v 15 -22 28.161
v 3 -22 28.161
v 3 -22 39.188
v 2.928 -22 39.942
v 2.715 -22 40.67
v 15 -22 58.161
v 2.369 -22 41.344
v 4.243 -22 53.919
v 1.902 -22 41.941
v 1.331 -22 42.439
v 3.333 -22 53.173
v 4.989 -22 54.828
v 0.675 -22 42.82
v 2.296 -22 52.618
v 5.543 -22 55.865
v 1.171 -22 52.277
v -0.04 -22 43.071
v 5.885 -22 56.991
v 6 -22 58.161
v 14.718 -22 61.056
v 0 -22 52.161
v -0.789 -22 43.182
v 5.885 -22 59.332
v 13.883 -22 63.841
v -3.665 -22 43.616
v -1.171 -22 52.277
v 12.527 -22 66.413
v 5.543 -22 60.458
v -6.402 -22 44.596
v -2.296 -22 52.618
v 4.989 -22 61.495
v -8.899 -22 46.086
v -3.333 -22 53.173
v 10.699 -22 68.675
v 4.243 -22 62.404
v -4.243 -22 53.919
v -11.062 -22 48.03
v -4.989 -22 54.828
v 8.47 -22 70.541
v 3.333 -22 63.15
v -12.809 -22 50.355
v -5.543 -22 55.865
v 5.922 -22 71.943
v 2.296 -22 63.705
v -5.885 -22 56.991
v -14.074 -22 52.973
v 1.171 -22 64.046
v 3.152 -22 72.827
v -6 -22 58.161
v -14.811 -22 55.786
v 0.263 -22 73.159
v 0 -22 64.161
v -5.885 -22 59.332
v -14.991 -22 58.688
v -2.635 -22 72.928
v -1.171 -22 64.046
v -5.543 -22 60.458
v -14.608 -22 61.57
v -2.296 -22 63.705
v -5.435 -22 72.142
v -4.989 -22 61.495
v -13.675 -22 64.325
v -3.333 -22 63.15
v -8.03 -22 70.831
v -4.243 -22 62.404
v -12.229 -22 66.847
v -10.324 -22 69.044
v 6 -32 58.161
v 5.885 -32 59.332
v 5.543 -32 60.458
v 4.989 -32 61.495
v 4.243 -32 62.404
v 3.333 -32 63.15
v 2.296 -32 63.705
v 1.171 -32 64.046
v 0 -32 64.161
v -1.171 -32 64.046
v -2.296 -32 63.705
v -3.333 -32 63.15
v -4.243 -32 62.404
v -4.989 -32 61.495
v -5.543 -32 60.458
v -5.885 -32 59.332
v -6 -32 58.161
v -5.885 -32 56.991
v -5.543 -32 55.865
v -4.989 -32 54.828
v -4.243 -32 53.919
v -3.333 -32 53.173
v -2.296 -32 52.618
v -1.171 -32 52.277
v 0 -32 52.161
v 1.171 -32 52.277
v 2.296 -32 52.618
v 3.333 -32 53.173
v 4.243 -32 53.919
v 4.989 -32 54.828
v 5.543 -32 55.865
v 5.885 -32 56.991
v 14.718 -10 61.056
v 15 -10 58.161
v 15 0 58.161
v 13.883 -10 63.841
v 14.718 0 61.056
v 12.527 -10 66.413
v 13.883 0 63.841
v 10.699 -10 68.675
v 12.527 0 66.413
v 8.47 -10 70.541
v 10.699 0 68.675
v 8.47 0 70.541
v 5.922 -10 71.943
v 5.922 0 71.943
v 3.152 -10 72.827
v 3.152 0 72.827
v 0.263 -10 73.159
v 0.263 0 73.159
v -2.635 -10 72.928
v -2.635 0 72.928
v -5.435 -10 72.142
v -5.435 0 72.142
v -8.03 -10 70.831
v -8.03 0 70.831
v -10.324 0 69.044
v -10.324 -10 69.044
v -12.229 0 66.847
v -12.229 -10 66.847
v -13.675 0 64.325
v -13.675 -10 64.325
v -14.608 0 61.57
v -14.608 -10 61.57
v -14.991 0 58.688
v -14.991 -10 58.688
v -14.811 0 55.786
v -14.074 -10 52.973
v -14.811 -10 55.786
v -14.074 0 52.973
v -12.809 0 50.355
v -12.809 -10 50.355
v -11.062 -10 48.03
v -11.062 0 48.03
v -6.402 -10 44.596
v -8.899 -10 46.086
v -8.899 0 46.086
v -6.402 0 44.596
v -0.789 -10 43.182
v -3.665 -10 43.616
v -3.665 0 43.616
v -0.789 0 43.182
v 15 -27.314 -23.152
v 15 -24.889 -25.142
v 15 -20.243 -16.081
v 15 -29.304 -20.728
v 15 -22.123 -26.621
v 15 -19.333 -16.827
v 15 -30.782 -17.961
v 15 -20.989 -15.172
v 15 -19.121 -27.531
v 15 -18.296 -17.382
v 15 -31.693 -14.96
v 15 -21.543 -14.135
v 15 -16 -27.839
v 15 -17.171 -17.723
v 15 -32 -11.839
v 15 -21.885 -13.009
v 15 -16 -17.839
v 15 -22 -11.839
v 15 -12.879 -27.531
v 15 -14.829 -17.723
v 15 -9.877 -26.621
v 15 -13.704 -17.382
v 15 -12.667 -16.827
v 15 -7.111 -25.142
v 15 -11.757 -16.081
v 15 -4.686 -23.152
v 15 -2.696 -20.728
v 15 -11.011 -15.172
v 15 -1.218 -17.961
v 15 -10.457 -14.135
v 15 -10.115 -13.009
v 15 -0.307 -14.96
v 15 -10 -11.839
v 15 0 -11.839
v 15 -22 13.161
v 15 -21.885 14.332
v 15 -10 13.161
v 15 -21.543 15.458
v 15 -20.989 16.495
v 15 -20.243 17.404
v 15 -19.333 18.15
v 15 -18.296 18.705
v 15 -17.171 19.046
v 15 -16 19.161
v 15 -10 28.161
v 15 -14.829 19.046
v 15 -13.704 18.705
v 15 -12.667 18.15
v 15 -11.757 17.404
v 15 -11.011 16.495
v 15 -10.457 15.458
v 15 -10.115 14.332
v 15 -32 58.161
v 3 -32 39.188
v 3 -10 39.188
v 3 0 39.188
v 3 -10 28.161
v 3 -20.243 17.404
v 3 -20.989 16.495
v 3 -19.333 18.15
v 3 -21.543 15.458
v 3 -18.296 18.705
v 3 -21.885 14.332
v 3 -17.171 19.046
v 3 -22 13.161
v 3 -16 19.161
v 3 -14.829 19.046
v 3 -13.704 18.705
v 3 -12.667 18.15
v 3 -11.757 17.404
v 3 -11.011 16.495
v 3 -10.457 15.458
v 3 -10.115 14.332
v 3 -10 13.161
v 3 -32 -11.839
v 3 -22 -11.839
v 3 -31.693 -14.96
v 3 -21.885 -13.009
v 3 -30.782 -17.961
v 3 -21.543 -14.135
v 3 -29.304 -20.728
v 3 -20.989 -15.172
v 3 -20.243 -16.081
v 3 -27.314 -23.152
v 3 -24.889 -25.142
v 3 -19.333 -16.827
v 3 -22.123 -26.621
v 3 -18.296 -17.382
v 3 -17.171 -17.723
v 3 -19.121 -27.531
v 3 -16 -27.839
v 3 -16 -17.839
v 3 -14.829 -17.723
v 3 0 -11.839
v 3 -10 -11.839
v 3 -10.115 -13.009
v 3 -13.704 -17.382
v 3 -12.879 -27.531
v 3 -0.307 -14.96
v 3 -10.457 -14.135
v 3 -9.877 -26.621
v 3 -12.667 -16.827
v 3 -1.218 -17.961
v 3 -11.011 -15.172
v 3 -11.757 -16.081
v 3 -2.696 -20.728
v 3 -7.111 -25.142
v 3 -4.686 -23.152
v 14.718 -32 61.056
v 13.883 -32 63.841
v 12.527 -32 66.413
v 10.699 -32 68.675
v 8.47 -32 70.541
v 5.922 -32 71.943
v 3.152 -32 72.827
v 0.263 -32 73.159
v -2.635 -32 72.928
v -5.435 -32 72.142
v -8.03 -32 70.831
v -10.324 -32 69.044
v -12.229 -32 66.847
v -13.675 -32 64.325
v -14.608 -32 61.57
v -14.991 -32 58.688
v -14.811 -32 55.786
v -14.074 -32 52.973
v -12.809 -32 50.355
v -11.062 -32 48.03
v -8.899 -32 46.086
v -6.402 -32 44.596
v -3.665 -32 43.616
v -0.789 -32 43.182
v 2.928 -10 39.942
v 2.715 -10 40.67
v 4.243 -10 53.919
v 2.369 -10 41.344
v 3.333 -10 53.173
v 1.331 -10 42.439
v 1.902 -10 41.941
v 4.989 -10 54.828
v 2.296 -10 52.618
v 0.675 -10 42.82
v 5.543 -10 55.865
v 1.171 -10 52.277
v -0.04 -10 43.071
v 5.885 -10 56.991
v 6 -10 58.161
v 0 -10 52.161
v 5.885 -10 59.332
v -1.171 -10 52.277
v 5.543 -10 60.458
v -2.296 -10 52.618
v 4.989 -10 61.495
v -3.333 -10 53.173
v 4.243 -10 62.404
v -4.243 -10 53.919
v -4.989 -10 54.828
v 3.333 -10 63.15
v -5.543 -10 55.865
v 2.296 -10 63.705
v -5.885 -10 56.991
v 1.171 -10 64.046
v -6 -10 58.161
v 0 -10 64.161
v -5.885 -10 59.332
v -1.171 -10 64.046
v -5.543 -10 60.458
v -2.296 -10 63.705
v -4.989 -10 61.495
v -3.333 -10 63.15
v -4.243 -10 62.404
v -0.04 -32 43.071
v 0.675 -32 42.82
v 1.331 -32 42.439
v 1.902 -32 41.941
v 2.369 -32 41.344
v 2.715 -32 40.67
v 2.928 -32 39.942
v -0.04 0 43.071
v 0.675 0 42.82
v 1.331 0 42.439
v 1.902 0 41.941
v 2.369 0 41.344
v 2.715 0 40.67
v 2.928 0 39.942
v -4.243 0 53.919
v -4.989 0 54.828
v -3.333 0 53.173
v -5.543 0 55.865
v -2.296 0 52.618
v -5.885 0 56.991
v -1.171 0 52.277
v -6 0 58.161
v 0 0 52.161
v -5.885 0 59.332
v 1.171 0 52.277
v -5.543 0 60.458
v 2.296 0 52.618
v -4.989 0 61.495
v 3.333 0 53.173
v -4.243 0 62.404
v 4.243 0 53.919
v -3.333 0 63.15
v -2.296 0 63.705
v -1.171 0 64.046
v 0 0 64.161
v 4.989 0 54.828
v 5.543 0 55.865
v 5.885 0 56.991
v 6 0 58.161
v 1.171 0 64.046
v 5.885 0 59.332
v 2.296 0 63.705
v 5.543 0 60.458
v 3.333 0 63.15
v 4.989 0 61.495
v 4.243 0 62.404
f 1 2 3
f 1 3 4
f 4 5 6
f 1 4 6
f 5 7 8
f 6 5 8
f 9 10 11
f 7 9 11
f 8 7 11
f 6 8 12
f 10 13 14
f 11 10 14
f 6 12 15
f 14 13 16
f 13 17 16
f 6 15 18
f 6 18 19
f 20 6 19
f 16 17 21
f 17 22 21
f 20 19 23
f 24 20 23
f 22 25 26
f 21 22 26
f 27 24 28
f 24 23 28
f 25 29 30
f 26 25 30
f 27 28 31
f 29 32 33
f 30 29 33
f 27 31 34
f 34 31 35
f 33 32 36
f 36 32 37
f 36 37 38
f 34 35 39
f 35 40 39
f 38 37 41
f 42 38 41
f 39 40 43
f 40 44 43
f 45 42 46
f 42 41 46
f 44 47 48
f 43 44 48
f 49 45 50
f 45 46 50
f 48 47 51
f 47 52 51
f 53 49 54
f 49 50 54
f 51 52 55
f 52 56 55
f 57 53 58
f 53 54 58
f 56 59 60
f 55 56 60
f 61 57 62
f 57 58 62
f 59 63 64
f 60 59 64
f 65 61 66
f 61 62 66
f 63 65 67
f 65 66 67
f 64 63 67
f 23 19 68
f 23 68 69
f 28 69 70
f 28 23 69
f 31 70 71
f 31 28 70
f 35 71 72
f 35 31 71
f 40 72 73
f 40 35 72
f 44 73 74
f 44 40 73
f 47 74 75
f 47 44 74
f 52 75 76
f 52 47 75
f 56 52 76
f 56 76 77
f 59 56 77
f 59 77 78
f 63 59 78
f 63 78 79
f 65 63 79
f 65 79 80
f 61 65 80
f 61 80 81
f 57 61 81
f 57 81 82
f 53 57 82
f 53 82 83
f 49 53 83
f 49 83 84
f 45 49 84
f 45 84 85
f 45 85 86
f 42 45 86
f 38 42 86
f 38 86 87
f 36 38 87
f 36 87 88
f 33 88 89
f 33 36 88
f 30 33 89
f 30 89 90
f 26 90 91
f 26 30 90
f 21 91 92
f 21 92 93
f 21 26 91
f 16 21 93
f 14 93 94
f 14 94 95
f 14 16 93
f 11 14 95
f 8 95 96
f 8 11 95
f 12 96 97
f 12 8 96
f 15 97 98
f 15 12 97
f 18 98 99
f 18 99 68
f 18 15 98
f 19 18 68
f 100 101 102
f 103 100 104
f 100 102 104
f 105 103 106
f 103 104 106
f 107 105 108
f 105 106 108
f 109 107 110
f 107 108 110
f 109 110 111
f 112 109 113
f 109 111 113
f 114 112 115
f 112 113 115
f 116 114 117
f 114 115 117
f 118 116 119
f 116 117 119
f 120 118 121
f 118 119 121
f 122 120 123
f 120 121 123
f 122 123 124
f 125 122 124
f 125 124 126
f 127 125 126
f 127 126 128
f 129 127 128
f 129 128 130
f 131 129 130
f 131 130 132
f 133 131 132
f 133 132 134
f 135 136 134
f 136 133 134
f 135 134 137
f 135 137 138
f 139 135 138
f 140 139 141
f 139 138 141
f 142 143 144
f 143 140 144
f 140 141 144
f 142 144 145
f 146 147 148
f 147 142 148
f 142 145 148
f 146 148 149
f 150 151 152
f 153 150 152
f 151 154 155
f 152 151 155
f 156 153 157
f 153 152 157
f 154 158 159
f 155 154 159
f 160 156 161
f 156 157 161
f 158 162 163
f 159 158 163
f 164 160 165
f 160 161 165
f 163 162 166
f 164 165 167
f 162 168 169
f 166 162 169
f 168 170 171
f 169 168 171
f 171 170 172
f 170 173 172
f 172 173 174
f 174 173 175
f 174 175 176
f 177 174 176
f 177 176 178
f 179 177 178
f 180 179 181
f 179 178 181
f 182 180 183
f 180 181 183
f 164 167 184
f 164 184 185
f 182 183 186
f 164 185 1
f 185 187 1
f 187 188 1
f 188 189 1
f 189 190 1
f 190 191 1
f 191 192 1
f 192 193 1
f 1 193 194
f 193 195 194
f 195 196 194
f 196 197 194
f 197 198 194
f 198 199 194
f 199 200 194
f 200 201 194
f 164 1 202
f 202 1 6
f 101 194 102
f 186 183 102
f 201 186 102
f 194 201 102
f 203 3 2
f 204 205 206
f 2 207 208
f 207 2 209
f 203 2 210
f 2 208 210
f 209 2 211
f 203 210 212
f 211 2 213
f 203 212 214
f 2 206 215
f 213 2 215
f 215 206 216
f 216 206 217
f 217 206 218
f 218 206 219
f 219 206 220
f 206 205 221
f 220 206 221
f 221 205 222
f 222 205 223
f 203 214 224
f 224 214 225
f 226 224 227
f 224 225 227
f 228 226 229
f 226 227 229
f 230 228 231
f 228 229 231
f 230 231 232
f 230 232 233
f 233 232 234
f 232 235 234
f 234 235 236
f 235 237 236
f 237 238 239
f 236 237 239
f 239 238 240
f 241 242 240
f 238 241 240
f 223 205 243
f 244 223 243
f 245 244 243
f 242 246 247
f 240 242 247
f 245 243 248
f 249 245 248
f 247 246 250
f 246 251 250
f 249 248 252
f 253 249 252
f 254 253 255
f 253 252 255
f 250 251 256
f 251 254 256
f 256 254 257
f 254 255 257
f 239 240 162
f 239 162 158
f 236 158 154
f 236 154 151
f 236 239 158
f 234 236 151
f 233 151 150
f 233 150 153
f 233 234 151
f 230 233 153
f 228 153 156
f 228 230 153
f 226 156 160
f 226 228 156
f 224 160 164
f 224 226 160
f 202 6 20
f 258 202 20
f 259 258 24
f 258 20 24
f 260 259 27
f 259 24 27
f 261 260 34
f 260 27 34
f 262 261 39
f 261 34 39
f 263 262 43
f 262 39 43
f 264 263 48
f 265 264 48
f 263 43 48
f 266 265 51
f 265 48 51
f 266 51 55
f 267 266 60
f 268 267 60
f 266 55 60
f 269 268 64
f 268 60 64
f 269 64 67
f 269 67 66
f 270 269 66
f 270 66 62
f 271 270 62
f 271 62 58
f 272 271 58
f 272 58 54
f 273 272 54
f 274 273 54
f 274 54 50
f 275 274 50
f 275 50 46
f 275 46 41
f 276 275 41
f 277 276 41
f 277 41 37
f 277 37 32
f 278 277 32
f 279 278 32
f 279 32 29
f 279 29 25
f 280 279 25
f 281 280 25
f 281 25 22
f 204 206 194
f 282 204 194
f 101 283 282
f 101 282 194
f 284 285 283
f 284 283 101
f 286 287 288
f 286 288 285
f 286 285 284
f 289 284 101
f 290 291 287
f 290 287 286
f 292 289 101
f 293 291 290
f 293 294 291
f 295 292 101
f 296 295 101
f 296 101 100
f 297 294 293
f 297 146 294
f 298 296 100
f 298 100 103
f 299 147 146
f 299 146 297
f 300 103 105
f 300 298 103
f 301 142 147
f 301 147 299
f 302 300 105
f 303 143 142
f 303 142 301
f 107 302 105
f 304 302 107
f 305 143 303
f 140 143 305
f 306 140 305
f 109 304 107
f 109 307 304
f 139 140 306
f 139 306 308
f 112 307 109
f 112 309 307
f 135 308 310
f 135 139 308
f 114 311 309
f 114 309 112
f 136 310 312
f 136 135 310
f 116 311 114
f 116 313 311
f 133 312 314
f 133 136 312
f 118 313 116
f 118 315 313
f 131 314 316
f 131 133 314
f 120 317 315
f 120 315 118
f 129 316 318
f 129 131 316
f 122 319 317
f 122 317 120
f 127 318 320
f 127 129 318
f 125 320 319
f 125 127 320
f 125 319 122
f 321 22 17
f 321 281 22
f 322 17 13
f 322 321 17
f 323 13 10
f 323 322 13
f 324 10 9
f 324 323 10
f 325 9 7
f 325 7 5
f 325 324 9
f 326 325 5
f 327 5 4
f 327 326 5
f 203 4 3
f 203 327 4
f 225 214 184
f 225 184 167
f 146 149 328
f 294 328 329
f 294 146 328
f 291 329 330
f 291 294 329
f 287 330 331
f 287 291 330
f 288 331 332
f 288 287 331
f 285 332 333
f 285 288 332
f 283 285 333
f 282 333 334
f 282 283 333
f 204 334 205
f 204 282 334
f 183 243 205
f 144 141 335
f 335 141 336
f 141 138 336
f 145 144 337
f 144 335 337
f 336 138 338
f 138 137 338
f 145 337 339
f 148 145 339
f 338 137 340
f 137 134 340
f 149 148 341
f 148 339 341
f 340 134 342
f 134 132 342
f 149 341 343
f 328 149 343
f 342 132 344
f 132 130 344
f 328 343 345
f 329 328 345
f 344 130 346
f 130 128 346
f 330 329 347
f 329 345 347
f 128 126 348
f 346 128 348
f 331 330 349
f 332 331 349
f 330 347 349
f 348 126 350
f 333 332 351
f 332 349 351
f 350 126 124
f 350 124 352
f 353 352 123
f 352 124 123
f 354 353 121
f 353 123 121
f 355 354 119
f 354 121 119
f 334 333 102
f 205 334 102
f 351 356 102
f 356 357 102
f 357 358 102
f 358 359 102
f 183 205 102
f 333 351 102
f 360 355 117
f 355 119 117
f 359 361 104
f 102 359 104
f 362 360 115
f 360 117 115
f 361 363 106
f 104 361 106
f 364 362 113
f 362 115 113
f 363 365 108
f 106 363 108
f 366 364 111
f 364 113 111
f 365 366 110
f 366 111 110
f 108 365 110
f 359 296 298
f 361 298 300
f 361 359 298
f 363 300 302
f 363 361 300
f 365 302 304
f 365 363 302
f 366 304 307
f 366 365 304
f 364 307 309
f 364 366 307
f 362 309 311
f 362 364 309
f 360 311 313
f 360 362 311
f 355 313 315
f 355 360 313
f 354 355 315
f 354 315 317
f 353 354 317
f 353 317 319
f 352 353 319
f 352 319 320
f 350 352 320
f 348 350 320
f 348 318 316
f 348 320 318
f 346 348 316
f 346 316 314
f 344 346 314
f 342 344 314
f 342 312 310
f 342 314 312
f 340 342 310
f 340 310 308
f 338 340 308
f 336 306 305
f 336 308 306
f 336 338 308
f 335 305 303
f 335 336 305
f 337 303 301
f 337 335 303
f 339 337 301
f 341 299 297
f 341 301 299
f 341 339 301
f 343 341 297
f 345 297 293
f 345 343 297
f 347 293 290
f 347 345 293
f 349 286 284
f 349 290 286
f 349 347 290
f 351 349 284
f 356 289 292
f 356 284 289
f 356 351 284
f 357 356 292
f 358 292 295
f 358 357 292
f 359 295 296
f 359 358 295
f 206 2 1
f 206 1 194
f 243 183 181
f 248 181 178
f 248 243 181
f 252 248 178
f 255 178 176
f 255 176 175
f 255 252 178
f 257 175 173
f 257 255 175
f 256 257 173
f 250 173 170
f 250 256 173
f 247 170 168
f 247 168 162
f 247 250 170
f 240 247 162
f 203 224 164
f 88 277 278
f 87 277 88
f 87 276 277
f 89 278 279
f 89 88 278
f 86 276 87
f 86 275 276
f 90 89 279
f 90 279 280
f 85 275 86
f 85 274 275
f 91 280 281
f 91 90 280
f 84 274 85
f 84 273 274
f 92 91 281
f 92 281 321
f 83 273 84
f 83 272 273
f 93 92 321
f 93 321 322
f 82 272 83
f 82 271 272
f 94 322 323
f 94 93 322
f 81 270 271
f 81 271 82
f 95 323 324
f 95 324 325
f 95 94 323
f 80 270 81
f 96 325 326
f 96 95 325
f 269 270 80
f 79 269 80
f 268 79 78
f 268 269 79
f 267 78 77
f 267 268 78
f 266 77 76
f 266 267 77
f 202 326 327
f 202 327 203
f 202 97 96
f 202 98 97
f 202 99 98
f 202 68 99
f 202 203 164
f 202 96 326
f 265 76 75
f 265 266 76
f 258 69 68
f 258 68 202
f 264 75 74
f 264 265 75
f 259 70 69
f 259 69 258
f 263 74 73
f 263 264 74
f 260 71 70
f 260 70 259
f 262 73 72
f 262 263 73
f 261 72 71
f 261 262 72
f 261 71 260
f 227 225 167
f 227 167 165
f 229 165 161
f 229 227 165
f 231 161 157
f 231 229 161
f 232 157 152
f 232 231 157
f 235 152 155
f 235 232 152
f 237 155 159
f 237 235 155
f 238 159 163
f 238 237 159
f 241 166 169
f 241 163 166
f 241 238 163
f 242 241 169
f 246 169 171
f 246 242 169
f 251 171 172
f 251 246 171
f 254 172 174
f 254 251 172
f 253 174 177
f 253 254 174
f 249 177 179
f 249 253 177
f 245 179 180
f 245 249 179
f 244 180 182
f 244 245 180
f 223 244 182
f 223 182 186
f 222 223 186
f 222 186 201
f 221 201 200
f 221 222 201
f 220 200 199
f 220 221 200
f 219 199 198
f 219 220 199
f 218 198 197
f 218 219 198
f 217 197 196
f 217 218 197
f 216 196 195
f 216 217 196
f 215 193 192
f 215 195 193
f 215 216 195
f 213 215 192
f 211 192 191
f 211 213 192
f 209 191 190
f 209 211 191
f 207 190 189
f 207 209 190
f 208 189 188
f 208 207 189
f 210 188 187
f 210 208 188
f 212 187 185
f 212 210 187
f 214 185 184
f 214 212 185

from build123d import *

# Parameters (mm, degrees)
F0_R     = 6
F1_DEPTH = 32
F3_W     = 12
F3_H     = 45
F4_DEPTH = 55.801
F5_R     = 4


with BuildPart() as f1:
    # F0 (on Front) → F1 (new body)
    with BuildSketch(Plane.XZ):
        with BuildLine():
            Line((15, -27.838539), (15, 58.161461))
            ThreePointArc((15, 58.161461), (-11.61895, 67.648294), (3, 43.464522))
            Line((3, 43.464522), (3, -27.838539))
            Line((3, -27.838539), (15, -27.838539))
        make_face()
        with Locations((0, 58.161461)):
            Circle(F0_R, mode=Mode.SUBTRACT)
    extrude(amount=F1_DEPTH)

    # F3 (on offset) → F4 (cut, through all)
    with BuildSketch(Plane.YZ.offset(-40.8)):
        with BuildLine():
            Line((0, -27.838539), (0, -11.838539))
            ThreePointArc((0, -11.838539), (-4.686292, -23.152248), (-16, -27.838539))
            Line((-16, -27.838539), (0, -27.838539))
        make_face()
        with BuildLine():
            Line((-32, -27.838539), (-16, -27.838539))
            ThreePointArc((-16, -27.838539), (-27.313708, -23.152248), (-32, -11.838539))
            Line((-32, -11.838539), (-32, -27.838539))
        make_face()
        with BuildLine():
            Line((-10, -11.838539), (-10, 13.161461))
            ThreePointArc((-10, 13.161461), (-16, 19.161461), (-22, 13.161461))
            Line((-22, 13.161461), (-22, -11.838539))
            ThreePointArc((-22, -11.838539), (-16, -17.838539), (-10, -11.838539))
        make_face()
        with Locations((-16, 50.661461)):
            Rectangle(F3_W, F3_H)
    extrude(amount=F4_DEPTH, mode=Mode.SUBTRACT)

    # F5
    f5_edges = [f1.edges().sort_by_distance(p)[0] for p in [
        (3, -5, 43.464522),
        (3, -27, 43.464522),
    ]]
    fillet(f5_edges, radius=F5_R)


solid = f1.part
